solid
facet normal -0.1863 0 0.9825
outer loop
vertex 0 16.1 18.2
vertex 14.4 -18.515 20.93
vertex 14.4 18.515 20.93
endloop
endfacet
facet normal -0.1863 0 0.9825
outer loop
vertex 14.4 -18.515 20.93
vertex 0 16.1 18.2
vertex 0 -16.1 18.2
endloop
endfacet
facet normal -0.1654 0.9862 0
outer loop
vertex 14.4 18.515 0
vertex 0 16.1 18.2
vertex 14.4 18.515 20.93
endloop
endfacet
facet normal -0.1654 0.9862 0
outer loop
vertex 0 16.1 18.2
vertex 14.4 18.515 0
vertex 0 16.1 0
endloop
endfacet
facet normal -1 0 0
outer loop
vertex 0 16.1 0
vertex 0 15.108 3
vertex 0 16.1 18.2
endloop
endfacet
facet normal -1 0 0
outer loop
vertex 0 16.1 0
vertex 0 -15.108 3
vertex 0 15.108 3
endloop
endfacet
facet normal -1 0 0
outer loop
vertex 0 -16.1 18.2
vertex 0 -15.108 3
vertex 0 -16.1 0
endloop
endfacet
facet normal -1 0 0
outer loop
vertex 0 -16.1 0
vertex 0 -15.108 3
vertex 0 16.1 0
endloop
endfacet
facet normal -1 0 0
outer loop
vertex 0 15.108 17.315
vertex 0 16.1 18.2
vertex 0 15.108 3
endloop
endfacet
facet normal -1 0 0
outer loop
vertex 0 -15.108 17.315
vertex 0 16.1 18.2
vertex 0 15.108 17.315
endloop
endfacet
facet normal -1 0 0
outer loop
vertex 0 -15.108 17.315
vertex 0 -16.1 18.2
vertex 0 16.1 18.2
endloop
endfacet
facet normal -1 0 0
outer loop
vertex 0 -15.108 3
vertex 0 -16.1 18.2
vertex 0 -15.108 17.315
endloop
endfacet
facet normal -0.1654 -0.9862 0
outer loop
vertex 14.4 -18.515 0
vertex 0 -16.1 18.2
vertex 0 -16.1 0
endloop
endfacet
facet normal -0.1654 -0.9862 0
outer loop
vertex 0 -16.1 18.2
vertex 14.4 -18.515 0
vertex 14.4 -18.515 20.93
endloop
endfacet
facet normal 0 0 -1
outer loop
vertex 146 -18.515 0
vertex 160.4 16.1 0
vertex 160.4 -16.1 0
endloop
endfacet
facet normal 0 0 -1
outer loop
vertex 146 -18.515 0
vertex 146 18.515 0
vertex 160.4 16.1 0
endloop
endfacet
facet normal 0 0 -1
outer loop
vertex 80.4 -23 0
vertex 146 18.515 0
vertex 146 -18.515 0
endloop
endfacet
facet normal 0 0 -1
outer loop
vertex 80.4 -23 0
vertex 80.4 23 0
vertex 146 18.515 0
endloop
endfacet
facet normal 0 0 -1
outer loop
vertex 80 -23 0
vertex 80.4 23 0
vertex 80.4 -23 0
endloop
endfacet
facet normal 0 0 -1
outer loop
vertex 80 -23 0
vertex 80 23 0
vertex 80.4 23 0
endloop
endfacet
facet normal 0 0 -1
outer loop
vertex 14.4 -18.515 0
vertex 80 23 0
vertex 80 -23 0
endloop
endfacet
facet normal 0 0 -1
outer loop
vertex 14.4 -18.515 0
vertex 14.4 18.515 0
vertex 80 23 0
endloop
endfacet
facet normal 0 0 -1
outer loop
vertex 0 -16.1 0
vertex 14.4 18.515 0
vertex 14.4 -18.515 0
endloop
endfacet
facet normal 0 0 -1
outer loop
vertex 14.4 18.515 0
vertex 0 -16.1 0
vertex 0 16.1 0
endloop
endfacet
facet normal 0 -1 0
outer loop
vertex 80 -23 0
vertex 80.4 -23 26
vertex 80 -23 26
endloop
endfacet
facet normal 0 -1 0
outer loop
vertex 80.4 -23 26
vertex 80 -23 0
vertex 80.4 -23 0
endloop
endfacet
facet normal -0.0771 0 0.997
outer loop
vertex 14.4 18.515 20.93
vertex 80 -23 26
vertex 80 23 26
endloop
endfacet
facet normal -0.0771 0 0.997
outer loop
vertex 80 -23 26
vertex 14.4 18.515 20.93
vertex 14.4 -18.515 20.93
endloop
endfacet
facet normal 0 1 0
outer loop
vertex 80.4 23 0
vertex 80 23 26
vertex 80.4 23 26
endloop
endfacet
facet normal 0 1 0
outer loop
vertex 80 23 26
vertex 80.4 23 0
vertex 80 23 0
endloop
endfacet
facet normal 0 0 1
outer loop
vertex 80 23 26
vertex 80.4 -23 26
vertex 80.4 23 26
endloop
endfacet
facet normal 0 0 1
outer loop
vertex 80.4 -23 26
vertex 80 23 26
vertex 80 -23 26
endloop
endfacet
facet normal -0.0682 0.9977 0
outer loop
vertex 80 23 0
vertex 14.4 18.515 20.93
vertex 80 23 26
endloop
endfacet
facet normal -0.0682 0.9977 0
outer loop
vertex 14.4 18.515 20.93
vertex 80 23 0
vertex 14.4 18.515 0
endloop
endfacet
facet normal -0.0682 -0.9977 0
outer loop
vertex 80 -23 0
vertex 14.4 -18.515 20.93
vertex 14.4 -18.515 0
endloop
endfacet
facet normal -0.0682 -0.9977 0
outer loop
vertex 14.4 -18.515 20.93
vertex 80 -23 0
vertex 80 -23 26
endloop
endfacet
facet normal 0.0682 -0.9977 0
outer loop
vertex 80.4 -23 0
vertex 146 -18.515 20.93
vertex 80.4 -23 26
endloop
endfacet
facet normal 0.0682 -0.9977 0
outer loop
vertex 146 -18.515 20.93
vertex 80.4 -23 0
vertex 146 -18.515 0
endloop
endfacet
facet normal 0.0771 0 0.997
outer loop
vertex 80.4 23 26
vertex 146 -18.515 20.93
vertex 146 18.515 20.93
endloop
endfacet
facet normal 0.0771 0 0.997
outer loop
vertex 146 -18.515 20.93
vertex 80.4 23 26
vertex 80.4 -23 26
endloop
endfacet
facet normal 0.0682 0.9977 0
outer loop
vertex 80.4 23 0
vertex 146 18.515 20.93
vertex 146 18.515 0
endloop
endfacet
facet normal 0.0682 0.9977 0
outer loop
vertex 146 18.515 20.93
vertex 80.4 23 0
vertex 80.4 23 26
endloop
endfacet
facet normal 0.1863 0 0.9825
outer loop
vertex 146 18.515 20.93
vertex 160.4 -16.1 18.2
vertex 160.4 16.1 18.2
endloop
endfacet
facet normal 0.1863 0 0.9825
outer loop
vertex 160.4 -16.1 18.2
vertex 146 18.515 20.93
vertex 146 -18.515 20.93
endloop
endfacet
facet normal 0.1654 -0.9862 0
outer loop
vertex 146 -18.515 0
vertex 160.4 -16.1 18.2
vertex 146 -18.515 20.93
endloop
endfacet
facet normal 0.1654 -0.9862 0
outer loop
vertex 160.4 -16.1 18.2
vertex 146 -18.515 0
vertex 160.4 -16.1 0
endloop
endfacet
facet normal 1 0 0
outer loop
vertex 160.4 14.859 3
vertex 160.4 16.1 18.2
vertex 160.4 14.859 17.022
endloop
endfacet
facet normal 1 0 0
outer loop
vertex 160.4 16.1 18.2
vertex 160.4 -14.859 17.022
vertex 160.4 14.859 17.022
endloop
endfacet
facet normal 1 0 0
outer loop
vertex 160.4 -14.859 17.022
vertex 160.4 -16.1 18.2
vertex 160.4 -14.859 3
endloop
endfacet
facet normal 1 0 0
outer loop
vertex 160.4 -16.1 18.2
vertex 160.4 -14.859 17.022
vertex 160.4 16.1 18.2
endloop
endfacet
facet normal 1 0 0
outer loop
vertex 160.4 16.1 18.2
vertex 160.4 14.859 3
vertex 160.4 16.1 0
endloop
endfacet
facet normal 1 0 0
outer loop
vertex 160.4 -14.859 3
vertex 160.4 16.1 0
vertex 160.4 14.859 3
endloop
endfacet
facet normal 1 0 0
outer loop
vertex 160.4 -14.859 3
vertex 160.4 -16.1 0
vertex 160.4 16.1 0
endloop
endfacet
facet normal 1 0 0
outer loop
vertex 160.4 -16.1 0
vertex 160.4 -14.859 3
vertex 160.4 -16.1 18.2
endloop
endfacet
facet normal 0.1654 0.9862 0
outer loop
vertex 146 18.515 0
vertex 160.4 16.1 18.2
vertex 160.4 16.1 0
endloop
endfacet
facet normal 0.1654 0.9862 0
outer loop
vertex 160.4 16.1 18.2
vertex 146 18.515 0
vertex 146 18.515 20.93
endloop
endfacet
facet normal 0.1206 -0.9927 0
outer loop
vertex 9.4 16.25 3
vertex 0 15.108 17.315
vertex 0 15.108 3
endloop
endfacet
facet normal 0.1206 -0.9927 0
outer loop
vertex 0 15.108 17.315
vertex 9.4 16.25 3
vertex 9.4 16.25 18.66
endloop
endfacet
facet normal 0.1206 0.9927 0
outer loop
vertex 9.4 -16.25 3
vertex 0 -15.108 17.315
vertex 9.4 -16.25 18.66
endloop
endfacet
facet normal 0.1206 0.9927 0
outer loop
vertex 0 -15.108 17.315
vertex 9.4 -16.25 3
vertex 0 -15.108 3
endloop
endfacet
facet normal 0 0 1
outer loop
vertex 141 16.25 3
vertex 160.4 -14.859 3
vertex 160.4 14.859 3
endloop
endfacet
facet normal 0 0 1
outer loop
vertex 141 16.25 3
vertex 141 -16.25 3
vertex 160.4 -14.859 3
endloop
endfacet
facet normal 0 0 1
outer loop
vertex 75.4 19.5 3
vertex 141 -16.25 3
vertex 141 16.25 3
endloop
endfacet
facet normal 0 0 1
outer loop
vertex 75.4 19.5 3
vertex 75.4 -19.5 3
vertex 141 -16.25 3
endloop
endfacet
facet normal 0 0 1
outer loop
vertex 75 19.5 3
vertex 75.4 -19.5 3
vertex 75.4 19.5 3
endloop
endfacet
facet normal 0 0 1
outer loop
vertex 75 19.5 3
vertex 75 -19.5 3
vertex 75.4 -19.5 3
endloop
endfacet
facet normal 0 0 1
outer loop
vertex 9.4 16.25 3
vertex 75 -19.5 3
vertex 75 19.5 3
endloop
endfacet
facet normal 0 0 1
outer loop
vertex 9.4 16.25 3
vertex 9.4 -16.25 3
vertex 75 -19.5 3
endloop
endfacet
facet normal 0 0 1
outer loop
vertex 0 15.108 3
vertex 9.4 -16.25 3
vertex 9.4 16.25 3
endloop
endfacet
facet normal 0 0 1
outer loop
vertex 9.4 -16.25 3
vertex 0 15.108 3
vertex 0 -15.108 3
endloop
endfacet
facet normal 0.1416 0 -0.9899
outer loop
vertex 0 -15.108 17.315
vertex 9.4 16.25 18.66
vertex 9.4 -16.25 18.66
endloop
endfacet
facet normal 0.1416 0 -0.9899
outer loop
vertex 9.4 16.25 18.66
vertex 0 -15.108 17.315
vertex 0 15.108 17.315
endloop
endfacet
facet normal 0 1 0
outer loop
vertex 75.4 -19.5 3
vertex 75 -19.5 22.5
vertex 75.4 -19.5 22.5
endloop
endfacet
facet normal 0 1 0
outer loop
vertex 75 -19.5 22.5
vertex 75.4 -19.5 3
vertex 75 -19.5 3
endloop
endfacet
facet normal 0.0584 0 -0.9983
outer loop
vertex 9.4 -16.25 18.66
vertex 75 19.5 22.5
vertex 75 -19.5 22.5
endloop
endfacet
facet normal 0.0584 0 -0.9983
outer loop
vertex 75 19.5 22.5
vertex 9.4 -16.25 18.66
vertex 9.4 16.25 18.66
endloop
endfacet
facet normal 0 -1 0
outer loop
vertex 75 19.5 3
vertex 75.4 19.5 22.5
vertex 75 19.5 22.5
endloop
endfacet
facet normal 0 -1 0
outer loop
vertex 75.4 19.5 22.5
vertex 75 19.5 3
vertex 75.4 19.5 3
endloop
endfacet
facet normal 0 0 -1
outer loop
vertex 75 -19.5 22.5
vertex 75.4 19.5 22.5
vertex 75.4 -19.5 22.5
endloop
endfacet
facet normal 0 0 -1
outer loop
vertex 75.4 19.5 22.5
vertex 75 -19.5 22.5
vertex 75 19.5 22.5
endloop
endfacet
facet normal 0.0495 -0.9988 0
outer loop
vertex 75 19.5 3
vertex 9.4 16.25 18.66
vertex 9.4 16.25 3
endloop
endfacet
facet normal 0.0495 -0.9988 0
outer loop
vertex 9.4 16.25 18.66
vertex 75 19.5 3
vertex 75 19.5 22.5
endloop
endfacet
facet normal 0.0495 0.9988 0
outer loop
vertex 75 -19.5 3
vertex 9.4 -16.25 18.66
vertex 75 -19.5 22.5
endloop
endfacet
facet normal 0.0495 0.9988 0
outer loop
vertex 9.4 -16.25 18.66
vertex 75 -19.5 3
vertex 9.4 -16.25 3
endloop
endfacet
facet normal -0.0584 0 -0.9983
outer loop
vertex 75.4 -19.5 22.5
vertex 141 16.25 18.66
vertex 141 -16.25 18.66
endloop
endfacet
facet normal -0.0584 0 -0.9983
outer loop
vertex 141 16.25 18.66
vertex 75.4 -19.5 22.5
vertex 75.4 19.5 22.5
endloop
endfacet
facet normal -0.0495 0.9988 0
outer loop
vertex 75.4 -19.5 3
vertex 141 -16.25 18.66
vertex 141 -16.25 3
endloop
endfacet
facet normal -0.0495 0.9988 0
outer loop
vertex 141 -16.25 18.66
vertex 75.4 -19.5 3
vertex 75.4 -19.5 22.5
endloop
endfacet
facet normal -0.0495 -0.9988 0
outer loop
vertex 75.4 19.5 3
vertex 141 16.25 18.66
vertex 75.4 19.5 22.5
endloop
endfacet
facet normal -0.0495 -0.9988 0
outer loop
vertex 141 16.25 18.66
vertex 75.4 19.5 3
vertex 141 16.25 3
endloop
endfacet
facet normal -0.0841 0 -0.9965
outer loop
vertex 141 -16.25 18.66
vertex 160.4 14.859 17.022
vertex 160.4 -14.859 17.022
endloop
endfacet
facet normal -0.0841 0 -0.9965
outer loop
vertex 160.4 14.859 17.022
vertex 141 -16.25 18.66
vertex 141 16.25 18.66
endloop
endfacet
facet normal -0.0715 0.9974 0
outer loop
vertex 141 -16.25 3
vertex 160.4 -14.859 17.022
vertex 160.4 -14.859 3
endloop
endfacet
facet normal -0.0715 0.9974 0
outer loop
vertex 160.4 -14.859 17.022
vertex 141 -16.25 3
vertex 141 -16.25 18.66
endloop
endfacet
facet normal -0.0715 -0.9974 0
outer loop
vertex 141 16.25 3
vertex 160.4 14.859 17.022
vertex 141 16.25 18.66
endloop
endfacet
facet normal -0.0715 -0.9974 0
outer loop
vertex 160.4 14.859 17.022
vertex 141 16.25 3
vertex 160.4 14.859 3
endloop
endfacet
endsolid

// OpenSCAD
$fn = 32;

// ----------------------------------------------------------------------
// Faired channel: 160 x 46 x 26 mm, 3.5 mm walls, faired ends
// ----------------------------------------------------------------------

// --- parameters (mm) ---
length = 160;             // channel length
width = 46;               // channel width at mid length
height = 26;              // channel height at mid length
wall = 3.5;               // side wall thickness
floor_t = 3;              // floor thickness
end_w = 32.2;             // faired end width
end_h = 18.2;             // faired end height

difference() {
  union() {
    hull() {
      translate([0, -16.1, 0]) cube([0.4, 32.2, 18.2]);
      translate([14.4, -18.515, 0]) cube([0.4, 37.03, 20.93]);
    }
    hull() {
      translate([14.4, -18.515, 0]) cube([0.4, 37.03, 20.93]);
      translate([80, -23, 0]) cube([0.4, 46, 26]);
    }
    hull() {
      translate([80, -23, 0]) cube([0.4, 46, 26]);
      translate([145.6, -18.515, 0]) cube([0.4, 37.03, 20.93]);
    }
    hull() {
      translate([145.6, -18.515, 0]) cube([0.4, 37.03, 20.93]);
      translate([160, -16.1, 0]) cube([0.4, 32.2, 18.2]);
    }
  }
  /* cavity, 5 mm proud of both ends so the ports are cut clean */
  hull() {
    translate([-5, -14.5, 3]) cube([0.4, 29, 13.6]);
    translate([9.4, -16.25, 3]) cube([0.4, 32.5, 15.66]);
  }
  hull() {
    translate([9.4, -16.25, 3]) cube([0.4, 32.5, 15.66]);
    translate([75, -19.5, 3]) cube([0.4, 39, 19.5]);
  }
  hull() {
    translate([75, -19.5, 3]) cube([0.4, 39, 19.5]);
    translate([140.6, -16.25, 3]) cube([0.4, 32.5, 15.66]);
  }
  hull() {
    translate([140.6, -16.25, 3]) cube([0.4, 32.5, 15.66]);
    translate([165, -14.5, 3]) cube([0.4, 29, 13.6]);
  }
}
